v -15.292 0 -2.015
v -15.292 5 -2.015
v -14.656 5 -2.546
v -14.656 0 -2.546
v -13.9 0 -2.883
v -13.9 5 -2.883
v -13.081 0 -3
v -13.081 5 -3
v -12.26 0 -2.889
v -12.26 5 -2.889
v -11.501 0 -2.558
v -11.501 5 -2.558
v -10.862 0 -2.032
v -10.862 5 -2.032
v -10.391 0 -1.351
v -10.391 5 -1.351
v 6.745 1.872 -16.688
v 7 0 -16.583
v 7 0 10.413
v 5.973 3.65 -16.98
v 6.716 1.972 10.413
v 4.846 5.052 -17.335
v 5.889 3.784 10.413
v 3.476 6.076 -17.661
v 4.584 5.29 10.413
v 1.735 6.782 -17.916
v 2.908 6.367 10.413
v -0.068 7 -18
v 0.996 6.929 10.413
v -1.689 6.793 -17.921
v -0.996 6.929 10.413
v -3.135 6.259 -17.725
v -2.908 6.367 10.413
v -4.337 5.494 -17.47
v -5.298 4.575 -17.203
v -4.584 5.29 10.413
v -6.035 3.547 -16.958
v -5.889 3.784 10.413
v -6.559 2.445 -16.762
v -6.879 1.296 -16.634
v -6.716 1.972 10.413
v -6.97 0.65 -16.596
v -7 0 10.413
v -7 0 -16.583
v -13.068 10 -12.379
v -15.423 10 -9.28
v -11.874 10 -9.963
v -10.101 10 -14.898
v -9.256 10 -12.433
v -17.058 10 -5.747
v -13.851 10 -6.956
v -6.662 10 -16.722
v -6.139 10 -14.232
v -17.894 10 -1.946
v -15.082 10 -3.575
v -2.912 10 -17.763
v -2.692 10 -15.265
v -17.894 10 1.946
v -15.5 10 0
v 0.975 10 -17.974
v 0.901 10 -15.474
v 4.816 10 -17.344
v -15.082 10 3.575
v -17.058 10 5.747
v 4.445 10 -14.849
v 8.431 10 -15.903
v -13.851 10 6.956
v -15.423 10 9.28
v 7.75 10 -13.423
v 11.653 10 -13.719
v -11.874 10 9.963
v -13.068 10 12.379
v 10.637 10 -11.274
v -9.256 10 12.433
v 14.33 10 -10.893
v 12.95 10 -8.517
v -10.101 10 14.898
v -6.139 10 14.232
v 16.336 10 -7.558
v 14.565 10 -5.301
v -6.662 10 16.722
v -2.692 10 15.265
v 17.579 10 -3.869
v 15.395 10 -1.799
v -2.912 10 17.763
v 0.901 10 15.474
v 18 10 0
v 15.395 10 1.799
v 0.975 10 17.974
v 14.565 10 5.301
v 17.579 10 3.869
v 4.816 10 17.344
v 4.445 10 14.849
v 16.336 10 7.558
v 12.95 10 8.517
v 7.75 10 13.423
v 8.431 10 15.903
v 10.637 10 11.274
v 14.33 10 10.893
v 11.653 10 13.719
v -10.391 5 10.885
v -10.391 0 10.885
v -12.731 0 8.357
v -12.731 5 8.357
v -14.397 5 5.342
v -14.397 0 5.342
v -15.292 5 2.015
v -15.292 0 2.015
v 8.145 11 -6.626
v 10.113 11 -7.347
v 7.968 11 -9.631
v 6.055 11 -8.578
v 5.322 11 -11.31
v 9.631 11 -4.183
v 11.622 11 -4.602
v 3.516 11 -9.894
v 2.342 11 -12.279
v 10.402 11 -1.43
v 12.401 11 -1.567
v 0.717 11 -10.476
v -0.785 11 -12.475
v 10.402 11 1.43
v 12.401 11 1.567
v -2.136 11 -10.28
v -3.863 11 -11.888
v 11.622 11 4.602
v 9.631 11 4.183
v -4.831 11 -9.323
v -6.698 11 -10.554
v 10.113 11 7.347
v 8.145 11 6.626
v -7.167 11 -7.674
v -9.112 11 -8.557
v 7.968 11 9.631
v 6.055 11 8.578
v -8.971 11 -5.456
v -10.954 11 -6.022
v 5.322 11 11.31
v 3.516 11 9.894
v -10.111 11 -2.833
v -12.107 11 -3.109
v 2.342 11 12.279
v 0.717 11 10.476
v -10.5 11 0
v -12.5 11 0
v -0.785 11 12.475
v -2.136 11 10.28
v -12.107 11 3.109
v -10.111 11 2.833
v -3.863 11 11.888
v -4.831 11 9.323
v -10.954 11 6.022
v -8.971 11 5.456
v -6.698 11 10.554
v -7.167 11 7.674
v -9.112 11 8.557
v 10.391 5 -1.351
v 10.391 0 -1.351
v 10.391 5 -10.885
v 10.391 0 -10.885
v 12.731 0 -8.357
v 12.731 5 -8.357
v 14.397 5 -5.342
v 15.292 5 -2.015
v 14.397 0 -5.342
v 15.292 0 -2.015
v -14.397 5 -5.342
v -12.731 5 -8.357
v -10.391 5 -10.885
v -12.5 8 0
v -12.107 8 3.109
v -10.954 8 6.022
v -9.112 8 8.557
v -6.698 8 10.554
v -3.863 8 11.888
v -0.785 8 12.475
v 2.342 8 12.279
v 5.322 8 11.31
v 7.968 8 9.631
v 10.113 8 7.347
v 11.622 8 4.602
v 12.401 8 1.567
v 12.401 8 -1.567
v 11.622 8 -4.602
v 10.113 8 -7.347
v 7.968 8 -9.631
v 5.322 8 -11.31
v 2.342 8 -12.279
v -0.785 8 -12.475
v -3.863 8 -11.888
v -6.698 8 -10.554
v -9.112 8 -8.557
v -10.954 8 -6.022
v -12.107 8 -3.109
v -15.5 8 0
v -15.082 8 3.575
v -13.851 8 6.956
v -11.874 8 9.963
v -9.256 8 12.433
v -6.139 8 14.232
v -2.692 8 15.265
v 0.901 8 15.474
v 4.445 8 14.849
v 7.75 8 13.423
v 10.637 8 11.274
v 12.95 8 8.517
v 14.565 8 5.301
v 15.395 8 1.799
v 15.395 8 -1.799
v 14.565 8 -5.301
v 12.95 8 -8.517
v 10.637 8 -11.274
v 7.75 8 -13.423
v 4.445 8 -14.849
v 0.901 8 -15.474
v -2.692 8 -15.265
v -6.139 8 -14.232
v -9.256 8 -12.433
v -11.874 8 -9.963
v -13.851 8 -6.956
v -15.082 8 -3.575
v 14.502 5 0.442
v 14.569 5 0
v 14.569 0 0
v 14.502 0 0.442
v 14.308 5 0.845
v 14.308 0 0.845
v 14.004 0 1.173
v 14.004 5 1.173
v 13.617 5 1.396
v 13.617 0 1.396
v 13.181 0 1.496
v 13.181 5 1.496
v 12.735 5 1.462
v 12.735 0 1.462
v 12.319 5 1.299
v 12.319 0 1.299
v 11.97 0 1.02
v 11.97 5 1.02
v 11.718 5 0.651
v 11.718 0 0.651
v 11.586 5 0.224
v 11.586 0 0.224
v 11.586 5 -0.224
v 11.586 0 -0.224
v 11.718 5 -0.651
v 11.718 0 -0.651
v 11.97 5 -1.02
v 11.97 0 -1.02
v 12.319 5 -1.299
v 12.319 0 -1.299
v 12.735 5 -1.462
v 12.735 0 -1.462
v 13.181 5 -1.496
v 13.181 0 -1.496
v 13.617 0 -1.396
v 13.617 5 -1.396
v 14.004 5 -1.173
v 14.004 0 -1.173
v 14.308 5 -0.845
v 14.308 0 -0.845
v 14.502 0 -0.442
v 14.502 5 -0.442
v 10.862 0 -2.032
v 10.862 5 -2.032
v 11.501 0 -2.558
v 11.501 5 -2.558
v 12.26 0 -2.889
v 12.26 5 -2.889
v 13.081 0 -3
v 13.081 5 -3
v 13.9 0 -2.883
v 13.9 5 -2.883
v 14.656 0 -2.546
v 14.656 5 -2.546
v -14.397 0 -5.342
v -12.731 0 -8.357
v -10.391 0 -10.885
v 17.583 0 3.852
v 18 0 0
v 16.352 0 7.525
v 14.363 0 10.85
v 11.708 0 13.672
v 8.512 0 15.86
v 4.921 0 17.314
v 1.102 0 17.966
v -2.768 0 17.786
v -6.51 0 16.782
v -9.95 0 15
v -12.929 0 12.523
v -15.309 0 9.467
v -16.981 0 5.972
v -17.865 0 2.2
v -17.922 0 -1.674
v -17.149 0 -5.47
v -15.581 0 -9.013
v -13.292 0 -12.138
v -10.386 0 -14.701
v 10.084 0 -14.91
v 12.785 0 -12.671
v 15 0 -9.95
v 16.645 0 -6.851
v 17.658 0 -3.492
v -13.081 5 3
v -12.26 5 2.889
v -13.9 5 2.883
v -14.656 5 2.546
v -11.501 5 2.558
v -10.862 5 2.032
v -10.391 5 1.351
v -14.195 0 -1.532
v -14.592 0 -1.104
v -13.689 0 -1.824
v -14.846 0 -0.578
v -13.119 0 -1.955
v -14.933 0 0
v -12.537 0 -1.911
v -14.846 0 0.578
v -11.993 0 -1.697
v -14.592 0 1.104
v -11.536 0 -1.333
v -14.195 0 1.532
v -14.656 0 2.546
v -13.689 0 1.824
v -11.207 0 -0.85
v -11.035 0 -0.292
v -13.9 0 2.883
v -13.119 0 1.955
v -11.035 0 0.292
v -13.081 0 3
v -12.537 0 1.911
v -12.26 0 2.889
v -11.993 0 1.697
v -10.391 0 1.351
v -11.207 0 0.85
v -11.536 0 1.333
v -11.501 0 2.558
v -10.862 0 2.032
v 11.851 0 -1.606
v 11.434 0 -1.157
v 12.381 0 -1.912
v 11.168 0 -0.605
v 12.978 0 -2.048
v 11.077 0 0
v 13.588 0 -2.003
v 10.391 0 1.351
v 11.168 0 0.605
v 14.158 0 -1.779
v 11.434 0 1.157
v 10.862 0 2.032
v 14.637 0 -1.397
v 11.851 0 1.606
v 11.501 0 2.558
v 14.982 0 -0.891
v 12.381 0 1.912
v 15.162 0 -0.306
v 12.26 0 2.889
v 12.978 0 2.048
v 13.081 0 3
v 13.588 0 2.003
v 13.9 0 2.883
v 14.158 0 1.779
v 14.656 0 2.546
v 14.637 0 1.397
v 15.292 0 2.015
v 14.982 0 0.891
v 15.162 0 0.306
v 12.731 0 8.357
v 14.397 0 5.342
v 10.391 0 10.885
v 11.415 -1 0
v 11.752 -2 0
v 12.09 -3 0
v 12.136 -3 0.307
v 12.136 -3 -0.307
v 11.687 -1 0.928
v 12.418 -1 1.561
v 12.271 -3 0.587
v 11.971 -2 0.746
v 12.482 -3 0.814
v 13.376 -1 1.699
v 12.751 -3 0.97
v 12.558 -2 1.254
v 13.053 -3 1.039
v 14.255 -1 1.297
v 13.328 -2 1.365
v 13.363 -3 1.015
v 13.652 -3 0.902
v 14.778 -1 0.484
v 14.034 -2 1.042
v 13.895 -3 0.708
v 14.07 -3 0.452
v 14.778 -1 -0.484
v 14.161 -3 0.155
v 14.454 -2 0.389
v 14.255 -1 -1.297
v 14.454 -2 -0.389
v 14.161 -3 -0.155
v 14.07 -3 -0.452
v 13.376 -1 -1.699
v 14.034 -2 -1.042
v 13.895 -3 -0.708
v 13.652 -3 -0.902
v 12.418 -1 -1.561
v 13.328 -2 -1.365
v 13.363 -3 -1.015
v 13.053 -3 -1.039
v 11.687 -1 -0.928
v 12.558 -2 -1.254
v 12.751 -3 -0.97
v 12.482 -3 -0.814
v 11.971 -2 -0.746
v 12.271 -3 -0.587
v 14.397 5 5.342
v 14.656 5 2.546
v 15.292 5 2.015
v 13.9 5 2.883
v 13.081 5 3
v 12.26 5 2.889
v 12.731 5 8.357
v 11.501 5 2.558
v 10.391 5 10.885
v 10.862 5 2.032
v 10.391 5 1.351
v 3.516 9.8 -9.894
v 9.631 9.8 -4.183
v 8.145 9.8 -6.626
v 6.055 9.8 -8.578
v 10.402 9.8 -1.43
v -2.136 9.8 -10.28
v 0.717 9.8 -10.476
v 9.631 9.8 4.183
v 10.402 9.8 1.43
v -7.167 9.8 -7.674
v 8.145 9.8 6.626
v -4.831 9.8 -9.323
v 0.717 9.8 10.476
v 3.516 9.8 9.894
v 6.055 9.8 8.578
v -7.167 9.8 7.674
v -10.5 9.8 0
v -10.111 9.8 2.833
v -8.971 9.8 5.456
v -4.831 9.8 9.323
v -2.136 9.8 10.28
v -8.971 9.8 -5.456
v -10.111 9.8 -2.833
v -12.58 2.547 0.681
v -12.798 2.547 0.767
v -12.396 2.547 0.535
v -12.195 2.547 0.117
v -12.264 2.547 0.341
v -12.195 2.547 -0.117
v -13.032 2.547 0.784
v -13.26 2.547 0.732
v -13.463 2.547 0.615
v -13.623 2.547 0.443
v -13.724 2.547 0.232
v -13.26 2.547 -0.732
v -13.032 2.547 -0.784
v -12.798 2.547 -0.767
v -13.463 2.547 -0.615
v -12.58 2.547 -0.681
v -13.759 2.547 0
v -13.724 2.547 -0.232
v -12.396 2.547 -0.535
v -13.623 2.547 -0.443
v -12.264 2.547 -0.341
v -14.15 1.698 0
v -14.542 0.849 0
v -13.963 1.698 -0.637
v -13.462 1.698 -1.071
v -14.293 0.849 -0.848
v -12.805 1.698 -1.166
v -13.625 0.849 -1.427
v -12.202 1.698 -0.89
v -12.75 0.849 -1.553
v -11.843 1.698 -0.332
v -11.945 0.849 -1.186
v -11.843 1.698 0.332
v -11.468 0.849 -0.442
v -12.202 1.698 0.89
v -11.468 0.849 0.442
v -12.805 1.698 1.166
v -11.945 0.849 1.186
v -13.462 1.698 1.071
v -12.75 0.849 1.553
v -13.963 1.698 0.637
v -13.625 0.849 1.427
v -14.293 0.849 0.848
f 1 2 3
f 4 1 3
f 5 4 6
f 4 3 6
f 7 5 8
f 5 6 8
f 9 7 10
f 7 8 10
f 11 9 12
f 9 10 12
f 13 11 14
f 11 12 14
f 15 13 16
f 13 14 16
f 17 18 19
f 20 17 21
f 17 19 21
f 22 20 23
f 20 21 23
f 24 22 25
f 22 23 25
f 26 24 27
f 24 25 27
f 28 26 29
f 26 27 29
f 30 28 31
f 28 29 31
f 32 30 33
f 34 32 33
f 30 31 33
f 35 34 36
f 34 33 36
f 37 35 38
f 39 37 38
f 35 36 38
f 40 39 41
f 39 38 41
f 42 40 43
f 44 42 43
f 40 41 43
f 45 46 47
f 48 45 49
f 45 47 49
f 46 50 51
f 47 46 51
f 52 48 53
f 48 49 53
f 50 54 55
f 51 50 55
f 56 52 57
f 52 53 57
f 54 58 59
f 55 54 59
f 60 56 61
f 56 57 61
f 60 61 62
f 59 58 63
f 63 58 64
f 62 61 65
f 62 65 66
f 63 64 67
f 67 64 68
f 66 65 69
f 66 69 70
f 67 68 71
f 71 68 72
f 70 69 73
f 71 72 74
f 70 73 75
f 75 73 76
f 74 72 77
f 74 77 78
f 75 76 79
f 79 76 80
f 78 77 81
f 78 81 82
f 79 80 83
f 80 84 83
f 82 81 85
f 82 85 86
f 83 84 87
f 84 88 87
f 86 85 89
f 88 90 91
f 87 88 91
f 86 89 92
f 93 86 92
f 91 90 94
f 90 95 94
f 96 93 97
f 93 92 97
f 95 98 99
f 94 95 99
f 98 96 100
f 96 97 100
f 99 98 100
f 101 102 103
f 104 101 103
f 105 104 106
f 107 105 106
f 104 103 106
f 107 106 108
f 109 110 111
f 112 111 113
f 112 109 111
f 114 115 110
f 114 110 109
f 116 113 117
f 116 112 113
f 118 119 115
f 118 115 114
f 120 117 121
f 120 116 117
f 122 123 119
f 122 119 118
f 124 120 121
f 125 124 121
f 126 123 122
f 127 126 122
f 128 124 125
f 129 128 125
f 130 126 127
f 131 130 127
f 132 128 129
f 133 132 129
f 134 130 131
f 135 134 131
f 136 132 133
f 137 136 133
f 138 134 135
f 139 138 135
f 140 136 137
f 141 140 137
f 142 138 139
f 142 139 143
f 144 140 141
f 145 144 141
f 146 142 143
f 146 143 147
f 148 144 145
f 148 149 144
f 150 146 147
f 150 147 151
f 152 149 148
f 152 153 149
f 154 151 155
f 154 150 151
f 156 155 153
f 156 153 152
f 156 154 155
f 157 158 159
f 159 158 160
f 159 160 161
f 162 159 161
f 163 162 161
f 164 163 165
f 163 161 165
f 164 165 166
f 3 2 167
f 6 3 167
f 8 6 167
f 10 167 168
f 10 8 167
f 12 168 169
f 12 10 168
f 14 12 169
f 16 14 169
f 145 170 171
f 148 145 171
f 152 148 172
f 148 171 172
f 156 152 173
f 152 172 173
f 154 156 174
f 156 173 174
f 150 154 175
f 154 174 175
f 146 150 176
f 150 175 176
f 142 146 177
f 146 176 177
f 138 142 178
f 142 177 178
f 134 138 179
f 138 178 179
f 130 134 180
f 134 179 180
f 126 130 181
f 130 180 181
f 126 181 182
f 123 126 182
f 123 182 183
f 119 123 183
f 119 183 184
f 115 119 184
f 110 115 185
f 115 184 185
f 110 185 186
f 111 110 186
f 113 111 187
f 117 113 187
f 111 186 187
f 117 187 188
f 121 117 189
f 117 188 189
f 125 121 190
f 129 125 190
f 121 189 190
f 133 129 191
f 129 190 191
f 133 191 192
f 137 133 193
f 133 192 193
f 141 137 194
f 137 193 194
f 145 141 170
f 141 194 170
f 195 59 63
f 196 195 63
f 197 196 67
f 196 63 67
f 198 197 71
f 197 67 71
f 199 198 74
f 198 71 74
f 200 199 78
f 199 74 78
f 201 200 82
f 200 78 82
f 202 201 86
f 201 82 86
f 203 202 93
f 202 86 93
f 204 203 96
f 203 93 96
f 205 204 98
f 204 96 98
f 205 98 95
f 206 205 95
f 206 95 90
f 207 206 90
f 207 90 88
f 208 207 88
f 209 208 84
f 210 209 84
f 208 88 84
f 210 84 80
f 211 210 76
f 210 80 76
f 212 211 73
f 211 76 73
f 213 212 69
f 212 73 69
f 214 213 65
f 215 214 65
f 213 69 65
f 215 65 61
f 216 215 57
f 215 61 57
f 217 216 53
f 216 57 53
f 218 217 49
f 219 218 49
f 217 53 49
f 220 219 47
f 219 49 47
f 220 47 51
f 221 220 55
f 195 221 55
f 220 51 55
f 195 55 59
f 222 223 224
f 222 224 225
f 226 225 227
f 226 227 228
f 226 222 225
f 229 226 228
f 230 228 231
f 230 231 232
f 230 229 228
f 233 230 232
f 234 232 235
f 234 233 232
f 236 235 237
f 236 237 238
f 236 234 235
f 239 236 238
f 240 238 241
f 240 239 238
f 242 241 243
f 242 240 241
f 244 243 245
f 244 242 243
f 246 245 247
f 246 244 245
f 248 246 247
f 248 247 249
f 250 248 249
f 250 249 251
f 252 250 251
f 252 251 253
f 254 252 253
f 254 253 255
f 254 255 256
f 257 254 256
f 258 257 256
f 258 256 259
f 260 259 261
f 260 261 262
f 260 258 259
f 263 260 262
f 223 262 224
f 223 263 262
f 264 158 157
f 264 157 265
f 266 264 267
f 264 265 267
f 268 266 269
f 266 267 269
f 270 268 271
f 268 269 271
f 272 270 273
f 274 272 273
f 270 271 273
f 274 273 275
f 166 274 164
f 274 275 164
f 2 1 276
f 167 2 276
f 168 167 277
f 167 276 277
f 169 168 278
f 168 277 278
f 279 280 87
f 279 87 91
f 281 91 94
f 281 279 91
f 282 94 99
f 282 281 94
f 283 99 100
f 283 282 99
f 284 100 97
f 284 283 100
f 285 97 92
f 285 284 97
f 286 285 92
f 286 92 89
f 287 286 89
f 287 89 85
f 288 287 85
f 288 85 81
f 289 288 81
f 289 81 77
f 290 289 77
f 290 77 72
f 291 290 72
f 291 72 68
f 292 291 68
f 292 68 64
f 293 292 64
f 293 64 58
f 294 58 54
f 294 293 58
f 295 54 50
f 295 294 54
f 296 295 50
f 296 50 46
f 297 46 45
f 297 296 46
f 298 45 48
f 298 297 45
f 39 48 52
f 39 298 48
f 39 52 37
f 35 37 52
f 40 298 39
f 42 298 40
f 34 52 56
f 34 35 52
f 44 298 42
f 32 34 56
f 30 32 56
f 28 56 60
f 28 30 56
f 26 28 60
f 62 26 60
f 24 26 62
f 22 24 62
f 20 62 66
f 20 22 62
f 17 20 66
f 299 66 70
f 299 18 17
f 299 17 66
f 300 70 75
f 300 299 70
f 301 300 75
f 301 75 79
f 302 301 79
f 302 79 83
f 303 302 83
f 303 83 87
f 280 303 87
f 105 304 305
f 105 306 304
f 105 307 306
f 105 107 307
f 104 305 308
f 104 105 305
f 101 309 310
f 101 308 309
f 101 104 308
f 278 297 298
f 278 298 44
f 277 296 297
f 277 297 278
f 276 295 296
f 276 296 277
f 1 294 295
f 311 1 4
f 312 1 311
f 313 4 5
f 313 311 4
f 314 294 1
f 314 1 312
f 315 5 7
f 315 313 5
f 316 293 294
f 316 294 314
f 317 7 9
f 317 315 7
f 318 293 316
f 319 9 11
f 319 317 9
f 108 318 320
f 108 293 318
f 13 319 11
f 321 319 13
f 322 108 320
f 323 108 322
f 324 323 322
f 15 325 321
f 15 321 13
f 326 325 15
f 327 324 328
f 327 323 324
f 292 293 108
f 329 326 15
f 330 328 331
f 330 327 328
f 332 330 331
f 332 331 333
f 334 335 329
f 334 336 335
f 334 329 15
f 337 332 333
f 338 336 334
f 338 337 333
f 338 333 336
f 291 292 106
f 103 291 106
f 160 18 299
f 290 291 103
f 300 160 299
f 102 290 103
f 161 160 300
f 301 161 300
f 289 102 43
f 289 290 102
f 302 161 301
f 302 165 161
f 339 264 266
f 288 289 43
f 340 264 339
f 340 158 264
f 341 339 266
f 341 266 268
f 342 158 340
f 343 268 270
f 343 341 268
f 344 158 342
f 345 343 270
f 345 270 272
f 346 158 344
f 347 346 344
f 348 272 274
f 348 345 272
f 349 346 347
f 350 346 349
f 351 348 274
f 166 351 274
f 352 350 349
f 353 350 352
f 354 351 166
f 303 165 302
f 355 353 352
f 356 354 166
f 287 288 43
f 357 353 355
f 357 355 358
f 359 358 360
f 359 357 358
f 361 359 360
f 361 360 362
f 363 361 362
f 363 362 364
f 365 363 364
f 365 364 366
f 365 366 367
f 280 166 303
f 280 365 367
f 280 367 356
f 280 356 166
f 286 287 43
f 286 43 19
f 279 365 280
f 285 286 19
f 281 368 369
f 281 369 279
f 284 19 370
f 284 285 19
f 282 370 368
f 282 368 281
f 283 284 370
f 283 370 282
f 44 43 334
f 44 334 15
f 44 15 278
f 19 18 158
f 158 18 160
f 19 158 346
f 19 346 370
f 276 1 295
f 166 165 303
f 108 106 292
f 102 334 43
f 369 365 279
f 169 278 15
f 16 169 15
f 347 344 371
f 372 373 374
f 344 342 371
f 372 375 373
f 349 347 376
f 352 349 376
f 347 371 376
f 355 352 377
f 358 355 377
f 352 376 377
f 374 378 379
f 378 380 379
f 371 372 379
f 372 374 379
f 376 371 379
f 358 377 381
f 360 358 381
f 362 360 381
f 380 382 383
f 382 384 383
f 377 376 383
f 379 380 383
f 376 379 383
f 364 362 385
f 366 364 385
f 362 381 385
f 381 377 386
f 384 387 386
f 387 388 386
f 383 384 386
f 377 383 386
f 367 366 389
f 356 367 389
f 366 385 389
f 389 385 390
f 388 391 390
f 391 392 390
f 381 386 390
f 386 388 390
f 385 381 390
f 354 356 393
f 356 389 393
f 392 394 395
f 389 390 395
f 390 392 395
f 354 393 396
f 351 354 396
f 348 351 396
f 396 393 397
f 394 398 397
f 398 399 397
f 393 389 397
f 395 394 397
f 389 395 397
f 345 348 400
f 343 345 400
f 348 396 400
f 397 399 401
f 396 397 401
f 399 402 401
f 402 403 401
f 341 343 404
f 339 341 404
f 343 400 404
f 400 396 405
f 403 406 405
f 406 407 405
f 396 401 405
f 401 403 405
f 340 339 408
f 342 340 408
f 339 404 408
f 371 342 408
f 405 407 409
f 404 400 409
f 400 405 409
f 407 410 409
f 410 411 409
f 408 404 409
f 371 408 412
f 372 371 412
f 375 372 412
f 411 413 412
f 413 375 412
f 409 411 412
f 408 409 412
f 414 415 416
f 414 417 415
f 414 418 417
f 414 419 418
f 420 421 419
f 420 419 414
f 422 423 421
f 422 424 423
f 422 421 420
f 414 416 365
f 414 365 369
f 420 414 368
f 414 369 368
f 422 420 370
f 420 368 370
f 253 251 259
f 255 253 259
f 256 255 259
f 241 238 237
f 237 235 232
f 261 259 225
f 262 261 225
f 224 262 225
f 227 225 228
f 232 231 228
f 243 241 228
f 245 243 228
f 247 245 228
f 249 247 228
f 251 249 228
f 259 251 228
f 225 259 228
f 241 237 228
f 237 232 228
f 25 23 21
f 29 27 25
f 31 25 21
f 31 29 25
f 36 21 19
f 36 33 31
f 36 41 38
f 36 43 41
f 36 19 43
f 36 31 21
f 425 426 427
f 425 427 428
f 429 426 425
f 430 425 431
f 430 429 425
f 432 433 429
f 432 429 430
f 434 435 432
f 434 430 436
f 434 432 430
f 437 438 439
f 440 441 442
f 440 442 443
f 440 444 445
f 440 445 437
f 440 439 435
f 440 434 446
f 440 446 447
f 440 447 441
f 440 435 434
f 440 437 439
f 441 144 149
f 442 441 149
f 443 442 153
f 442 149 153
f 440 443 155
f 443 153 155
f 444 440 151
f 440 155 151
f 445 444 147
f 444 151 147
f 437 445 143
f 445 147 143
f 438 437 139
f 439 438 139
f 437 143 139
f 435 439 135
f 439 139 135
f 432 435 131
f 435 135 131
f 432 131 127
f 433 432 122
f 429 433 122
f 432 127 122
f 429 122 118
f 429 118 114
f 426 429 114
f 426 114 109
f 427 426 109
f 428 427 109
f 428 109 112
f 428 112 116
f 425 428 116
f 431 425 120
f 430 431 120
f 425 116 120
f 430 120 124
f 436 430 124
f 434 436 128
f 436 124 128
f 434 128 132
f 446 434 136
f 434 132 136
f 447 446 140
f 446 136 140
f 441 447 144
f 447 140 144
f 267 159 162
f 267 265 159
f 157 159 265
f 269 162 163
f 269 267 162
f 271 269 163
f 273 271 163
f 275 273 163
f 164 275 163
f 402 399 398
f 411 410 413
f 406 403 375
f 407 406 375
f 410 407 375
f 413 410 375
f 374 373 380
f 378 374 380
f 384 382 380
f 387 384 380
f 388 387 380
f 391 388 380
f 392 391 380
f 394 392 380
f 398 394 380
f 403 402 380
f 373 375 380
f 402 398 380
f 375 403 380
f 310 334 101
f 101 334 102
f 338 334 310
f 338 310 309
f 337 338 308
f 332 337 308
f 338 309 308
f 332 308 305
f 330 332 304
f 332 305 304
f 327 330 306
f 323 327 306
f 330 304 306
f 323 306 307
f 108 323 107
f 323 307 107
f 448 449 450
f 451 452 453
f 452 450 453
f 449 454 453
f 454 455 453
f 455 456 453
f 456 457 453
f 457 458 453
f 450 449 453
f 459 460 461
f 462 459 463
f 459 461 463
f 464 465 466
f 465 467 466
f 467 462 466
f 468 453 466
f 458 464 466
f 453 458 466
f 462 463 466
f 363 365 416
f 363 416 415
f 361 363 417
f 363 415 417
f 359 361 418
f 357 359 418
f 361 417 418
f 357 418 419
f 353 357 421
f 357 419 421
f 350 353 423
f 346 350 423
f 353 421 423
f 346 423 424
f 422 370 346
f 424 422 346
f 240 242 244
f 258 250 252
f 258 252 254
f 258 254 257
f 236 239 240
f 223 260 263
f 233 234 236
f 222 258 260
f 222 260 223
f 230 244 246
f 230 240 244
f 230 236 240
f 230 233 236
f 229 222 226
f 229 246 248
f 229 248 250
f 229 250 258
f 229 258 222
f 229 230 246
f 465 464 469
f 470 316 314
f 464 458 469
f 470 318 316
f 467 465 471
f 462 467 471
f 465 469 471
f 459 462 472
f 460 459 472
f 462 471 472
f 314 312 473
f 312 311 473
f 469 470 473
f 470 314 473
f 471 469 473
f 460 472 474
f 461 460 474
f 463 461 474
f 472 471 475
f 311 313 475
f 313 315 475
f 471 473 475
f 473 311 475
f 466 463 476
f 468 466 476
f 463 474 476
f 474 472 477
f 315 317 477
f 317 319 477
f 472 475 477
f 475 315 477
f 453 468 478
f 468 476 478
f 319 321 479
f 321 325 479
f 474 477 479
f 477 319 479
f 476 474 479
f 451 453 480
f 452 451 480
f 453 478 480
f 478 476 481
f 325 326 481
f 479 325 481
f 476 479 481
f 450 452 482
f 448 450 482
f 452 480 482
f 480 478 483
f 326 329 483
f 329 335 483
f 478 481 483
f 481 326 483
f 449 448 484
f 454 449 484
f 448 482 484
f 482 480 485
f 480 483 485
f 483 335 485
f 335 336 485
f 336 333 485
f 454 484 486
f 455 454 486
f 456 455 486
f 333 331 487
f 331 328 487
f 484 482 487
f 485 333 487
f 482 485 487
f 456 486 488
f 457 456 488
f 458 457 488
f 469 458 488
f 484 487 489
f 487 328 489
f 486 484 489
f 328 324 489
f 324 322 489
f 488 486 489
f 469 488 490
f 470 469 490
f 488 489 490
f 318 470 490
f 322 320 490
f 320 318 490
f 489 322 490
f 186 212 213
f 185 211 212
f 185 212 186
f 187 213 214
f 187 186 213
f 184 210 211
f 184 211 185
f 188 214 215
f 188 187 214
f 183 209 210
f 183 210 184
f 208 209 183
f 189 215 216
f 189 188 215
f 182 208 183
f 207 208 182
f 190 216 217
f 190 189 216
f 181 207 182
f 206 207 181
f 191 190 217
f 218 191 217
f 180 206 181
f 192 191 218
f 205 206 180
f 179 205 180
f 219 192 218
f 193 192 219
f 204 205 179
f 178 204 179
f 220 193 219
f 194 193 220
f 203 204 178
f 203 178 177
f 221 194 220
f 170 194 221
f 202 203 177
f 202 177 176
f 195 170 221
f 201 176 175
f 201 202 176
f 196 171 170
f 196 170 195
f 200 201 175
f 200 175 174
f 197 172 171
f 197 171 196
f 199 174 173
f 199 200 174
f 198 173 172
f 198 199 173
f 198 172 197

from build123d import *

# Parameters (mm, degrees)
F0_R      = 18
F1_DEPTH  = 10
F2_R      = 15.5
F3_DEPTH  = 2
F5_DEPTH  = 5
F6_R      = 3
F6_R_2    = 1.5
F7_DEPTH  = 5
F8_R      = 12.5
F9_DEPTH  = 3
F10_R     = 10.5
F11_DEPTH = 1.2
F16_W     = 7
F16_H     = 30.015691
F17_ANGLE = -180


with BuildPart() as f1:
    # F0 (on Front) → F1 (new body)
    with BuildSketch(Plane.XZ):
        Circle(F0_R)
    extrude(amount=-F1_DEPTH)

    # F2 (on face) → F3 (cut)
    with BuildSketch(Plane(origin=(0, 10, 0), x_dir=(-1, 0, 0), z_dir=(0, 1, 0))):
        Circle(F2_R)
    extrude(amount=-F3_DEPTH, mode=Mode.SUBTRACT)

    # F4 (on face) → F5 (cut)
    with BuildSketch(Plane.XZ):
        with BuildLine():
            ThreePointArc((10.390717, -10.885251), (15.434695, 0), (10.390717, 10.885251))
            Line((10.390717, 10.885251), (10.390717, -10.885251))
        make_face()
        with BuildLine():
            Line((-10.390717, -10.885251), (-10.390717, 10.885251))
            ThreePointArc((-10.390717, 10.885251), (-15.434695, 0), (-10.390717, -10.885251))
        make_face()
    extrude(amount=-F5_DEPTH, mode=Mode.SUBTRACT)

    # F6 (on face) → F7 (join)
    with BuildSketch(Plane.XZ.offset(-5)):
        with Locations((-13.069113, 0)):
            Circle(F6_R)
        with Locations((13.069113, 0)):
            Circle(F6_R)
        with Locations((13.069113, 0)):
            Circle(F6_R_2, mode=Mode.SUBTRACT)
    extrude(amount=F7_DEPTH)

    # F8 (on face) → F9 (join)
    with BuildSketch(Plane(origin=(0, 8, 0), x_dir=(-1, 0, 0), z_dir=(0, 1, 0))):
        Circle(F8_R)
    extrude(amount=F9_DEPTH)

    # F10 (on face) → F11 (cut)
    with BuildSketch(Plane(origin=(0, 11, 0), x_dir=(-1, 0, 0), z_dir=(0, 1, 0))):
        Circle(F10_R)
    extrude(amount=-F11_DEPTH, mode=Mode.SUBTRACT)

    # F12 (on Top) → F13 (revolve)
    with BuildSketch(Plane.XY):
        Polygon((13.131262, 0), (11.077145, 0), (12.089682, -3), (13.131262, -3), align=None)
    revolve(axis=Axis((13.131262, 2.278473, 0), (0, 1, 0)))

    # F14 (on Top) → F15 (revolve, cut)
    with BuildSketch(Plane.XY):
        Polygon((-13.759153, 2.54694), (-14.932801, 0), (-12.972816, 0), (-12.972816, 2.54694), align=None)
    revolve(axis=Axis((-12.972816, -1.87905, 0), (0, -1, 0)), mode=Mode.SUBTRACT)

    # F16 (on face) → F17 (revolve, cut)
    with BuildSketch(Plane.XZ):
        with Locations((3.5, -4.595023)):
            Rectangle(F16_W, F16_H)
    revolve(axis=Axis((0, 0, -3.36439), (0, 0, -1)), revolution_arc=F17_ANGLE, mode=Mode.SUBTRACT)


solid = f1.part
